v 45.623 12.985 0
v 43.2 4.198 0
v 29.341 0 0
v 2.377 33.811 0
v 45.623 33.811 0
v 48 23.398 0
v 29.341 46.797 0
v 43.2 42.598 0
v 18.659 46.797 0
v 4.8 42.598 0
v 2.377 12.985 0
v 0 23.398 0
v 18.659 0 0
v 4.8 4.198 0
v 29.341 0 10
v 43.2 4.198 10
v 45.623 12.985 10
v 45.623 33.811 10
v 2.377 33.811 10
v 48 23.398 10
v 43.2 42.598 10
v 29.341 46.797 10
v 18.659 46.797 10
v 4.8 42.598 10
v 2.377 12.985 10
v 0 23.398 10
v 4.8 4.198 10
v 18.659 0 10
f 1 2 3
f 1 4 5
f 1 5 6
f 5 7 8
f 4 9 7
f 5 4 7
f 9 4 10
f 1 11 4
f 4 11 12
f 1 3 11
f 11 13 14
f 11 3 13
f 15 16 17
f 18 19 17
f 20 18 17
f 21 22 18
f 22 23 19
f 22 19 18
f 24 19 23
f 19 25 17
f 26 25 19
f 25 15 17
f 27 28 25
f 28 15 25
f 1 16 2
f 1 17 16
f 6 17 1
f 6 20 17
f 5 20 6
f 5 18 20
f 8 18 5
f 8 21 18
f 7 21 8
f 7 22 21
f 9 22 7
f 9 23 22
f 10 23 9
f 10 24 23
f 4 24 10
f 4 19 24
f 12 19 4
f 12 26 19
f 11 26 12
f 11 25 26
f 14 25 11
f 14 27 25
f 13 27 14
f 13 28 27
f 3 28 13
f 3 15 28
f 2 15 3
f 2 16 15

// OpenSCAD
$fn = 32;

// ----------------------------------------------------------------------
// Flat adaptor: hex_disc, 10 mm thick
// ----------------------------------------------------------------------

// --- parameters (mm) ---
profile_height = 10;      // extrusion height
profile_points = 14;      // points of the closed outline

profile = [[0, 23.398], [2.377, 12.985], [4.8, 4.198], [18.659, 0], [29.341, 0], [43.2, 4.198], [45.623, 12.985], [48, 23.398], [45.623, 33.811], [43.2, 42.598], [29.341, 46.797], [18.659, 46.797], [4.8, 42.598], [2.377, 33.811]];  // single closed polygon, 14 points, counter clockwise

// --- the one profile operation ---
linear_extrude(height = profile_height) polygon(points = profile);
